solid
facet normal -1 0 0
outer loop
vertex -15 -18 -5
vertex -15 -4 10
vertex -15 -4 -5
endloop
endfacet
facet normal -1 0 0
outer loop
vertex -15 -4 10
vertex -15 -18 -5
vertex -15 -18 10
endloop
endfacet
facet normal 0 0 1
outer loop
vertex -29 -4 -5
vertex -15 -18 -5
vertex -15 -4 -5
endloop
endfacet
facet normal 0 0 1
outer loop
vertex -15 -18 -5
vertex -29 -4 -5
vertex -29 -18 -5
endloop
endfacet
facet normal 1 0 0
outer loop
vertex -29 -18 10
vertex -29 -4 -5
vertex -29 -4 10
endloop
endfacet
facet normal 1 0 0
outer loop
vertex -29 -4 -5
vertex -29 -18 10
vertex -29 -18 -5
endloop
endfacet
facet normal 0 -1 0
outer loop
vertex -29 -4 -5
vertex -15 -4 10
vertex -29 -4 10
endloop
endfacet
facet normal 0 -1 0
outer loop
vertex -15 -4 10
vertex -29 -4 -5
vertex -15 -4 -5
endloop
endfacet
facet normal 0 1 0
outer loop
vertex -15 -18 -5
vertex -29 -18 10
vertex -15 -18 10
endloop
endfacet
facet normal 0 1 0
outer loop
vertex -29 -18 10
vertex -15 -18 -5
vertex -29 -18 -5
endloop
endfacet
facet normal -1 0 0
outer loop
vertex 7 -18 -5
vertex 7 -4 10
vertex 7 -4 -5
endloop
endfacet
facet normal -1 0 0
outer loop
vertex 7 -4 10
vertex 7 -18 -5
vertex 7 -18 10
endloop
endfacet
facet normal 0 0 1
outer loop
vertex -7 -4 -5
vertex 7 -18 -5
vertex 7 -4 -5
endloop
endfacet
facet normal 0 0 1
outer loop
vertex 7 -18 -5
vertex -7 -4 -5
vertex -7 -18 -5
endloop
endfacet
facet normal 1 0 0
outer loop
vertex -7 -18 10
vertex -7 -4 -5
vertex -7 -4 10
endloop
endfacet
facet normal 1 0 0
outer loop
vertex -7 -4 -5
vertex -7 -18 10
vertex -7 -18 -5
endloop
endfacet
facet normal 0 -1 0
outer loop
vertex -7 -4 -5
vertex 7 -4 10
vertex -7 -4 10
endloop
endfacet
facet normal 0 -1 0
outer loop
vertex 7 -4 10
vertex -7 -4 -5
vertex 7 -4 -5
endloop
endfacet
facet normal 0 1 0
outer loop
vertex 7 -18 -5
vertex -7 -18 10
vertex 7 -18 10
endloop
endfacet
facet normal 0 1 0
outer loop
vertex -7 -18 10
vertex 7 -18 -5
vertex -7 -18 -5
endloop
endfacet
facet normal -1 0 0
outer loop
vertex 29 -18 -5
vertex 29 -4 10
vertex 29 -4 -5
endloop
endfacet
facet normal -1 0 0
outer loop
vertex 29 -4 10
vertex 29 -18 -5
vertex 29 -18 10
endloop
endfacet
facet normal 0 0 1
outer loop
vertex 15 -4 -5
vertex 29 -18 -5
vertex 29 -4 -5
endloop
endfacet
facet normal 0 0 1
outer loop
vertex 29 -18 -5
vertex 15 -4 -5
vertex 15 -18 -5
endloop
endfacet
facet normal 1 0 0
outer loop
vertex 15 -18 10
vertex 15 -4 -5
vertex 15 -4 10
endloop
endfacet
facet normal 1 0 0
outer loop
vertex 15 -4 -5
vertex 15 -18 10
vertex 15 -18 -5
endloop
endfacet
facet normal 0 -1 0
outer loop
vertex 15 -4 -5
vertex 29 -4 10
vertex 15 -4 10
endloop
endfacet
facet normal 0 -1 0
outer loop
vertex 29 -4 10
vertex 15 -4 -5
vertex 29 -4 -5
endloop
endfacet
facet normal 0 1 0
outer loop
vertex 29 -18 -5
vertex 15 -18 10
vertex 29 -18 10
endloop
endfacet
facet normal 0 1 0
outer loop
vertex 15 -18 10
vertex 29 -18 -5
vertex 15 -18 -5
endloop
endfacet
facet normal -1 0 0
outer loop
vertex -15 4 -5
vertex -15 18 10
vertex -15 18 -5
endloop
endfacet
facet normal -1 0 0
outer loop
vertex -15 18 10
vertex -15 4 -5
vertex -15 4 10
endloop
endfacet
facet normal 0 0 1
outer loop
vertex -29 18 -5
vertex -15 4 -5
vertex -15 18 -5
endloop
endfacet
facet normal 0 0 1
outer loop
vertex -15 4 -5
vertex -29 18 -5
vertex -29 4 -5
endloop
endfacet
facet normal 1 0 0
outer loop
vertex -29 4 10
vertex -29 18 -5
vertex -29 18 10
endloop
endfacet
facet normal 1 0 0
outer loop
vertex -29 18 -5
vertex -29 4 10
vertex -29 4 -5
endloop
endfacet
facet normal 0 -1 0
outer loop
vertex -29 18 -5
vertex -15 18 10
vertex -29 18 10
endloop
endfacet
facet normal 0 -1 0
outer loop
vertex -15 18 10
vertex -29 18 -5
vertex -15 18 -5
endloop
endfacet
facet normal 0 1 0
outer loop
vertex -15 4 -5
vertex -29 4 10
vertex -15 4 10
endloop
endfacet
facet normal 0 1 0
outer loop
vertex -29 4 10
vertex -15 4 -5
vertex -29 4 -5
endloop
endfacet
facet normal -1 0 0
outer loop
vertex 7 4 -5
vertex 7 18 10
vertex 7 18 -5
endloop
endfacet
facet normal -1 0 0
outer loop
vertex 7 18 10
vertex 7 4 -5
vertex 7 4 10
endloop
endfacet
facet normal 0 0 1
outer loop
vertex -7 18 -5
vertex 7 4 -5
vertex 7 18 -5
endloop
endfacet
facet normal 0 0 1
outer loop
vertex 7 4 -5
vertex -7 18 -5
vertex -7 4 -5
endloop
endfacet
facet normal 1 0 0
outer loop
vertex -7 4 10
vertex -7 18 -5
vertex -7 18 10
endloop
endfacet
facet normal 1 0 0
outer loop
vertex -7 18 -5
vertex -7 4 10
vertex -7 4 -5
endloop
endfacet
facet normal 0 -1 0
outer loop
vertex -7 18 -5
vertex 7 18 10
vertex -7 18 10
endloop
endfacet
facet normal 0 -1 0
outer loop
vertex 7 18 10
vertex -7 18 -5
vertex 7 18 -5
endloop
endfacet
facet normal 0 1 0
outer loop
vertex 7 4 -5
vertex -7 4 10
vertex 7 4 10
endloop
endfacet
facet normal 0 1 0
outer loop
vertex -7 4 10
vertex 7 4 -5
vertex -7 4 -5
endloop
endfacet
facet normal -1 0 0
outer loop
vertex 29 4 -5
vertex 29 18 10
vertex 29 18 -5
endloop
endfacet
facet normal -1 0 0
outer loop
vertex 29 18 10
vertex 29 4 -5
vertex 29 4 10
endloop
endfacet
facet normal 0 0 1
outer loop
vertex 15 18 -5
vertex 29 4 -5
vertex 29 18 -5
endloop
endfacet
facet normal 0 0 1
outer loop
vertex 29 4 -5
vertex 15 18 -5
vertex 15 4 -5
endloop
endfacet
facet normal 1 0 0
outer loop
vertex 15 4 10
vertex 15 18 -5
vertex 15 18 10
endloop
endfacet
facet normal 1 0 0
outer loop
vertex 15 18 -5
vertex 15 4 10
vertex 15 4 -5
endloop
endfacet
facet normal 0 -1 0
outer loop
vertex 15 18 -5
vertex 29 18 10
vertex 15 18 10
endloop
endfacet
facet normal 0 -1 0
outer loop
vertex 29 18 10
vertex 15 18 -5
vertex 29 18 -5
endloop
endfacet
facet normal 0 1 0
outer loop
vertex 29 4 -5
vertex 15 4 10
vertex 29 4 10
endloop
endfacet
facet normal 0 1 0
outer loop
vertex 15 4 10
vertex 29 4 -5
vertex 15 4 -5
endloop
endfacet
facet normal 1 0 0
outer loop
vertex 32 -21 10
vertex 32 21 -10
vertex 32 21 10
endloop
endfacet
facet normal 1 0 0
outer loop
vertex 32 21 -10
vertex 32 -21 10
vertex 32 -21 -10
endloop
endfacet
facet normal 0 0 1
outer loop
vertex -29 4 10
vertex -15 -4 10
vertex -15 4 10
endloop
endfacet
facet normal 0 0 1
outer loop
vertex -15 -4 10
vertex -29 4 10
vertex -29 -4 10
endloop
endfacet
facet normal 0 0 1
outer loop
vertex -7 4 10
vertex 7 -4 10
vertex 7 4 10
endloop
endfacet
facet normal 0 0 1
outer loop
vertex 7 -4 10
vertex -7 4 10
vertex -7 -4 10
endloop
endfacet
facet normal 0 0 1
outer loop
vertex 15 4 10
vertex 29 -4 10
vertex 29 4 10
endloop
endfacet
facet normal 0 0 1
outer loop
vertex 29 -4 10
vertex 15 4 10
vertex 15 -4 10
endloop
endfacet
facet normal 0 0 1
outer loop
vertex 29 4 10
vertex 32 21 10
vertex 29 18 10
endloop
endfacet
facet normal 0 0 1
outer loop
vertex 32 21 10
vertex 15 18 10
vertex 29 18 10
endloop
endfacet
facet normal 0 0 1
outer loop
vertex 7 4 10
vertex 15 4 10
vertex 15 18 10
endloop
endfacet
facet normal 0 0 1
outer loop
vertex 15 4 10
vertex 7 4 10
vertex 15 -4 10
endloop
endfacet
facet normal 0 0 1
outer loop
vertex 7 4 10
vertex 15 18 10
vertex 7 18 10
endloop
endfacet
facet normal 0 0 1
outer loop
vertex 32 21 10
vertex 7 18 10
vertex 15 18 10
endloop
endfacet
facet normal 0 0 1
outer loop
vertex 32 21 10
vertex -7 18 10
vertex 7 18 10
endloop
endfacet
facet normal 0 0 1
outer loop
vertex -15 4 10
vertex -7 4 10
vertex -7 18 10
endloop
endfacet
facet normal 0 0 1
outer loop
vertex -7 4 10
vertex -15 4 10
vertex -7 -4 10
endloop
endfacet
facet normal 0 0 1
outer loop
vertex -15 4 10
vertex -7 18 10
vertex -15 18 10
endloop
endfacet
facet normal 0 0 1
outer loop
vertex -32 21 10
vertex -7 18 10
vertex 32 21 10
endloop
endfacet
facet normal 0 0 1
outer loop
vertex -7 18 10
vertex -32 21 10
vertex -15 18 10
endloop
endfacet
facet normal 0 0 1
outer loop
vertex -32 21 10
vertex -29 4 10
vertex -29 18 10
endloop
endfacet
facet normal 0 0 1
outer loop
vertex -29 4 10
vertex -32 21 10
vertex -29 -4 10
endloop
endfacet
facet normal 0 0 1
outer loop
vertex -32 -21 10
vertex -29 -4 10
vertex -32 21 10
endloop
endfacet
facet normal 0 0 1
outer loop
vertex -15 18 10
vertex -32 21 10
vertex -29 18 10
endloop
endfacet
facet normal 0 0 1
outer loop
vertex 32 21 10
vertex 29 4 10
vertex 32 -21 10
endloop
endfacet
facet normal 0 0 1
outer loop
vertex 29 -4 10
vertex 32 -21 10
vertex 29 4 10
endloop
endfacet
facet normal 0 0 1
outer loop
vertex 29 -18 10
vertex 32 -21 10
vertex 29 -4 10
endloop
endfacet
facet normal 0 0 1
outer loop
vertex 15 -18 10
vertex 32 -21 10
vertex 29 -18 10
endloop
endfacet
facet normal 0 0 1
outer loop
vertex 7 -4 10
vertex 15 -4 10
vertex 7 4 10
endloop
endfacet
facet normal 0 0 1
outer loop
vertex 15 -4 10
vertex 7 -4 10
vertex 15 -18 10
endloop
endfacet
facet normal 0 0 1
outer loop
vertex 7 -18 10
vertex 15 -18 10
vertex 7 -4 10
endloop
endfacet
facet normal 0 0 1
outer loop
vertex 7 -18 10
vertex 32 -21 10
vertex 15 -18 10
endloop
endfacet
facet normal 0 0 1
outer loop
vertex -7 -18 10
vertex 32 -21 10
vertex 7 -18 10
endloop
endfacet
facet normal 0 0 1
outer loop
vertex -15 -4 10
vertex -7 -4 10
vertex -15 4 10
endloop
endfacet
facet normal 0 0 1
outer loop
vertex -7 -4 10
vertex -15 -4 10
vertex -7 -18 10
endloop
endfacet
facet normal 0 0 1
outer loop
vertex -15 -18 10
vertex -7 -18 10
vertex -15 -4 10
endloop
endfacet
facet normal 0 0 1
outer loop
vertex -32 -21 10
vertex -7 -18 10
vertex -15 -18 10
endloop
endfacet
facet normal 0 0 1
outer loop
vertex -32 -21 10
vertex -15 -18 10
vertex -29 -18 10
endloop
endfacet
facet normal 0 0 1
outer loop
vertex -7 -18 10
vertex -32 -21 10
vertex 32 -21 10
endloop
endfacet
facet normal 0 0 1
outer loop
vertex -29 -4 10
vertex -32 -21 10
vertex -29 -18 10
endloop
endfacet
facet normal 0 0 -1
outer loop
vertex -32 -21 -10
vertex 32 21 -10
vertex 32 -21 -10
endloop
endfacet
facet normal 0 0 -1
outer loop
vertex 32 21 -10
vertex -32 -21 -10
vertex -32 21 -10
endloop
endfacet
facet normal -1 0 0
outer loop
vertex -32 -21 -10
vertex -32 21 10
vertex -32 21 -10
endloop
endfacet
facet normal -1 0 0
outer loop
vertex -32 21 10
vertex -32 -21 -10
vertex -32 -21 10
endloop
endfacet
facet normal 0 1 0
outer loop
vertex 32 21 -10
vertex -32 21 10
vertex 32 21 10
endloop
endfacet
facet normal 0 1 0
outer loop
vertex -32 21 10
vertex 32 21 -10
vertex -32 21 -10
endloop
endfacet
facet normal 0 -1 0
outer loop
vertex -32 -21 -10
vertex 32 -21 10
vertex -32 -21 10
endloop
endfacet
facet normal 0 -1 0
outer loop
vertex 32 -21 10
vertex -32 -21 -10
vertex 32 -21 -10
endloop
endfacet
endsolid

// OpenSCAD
$fn = 32;

// ----------------------------------------------------------------------
// Pocket plate 64 x 42 x 20
// 2 x 3 pockets 14 mm square, 15 mm deep
// ----------------------------------------------------------------------

// --- parameters (mm) ---
thickness = 20;  // plate thickness
floor_t = 5;     // material left under each pocket
pocket = 14;     // pocket side length
pitch_x = 22;    // pocket pitch along X
pitch_y = 22;    // pocket pitch along Y
cols = 3;        // pockets per row
rows = 2;        // rows of pockets

// --- derived feature positions (mm) ---
depth = thickness - floor_t;        // = 15   pocket depth, down to the floor
span_x = (cols - 1) * pitch_x;      // = 44   distance between outer pockets
span_y = (rows - 1) * pitch_y;      // = 22   distance between outer pocket rows
origin_x = -span_x / 2;             // = -22   X of the first pocket
origin_y = -span_y / 2;             // = -11   Y of the first pocket
plate = [span_x + pocket + 6, span_y + pocket + 6, thickness];  // = [64, 42, 20]   overall size: pockets plus 3 mm of wall on each side
feature_centers = [
  [origin_x + 0 * pitch_x, origin_y + 0 * pitch_y],
  [origin_x + 1 * pitch_x, origin_y + 0 * pitch_y],
  [origin_x + 2 * pitch_x, origin_y + 0 * pitch_y],
  [origin_x + 0 * pitch_x, origin_y + 1 * pitch_y],
  [origin_x + 1 * pitch_x, origin_y + 1 * pitch_y],
  [origin_x + 2 * pitch_x, origin_y + 1 * pitch_y]
];   // pocket centres, used verbatim by the cutter loop

// plate outline, then one pocket per centre in feature_centers
difference() {
  cube(plate, center = true);
  for (centre = feature_centers)
    translate([centre[0] - pocket / 2, centre[1] - pocket / 2, plate[2] / 2 - depth])
      cube([pocket, pocket, depth + 1]);  // centred on the declared pocket centre
}
